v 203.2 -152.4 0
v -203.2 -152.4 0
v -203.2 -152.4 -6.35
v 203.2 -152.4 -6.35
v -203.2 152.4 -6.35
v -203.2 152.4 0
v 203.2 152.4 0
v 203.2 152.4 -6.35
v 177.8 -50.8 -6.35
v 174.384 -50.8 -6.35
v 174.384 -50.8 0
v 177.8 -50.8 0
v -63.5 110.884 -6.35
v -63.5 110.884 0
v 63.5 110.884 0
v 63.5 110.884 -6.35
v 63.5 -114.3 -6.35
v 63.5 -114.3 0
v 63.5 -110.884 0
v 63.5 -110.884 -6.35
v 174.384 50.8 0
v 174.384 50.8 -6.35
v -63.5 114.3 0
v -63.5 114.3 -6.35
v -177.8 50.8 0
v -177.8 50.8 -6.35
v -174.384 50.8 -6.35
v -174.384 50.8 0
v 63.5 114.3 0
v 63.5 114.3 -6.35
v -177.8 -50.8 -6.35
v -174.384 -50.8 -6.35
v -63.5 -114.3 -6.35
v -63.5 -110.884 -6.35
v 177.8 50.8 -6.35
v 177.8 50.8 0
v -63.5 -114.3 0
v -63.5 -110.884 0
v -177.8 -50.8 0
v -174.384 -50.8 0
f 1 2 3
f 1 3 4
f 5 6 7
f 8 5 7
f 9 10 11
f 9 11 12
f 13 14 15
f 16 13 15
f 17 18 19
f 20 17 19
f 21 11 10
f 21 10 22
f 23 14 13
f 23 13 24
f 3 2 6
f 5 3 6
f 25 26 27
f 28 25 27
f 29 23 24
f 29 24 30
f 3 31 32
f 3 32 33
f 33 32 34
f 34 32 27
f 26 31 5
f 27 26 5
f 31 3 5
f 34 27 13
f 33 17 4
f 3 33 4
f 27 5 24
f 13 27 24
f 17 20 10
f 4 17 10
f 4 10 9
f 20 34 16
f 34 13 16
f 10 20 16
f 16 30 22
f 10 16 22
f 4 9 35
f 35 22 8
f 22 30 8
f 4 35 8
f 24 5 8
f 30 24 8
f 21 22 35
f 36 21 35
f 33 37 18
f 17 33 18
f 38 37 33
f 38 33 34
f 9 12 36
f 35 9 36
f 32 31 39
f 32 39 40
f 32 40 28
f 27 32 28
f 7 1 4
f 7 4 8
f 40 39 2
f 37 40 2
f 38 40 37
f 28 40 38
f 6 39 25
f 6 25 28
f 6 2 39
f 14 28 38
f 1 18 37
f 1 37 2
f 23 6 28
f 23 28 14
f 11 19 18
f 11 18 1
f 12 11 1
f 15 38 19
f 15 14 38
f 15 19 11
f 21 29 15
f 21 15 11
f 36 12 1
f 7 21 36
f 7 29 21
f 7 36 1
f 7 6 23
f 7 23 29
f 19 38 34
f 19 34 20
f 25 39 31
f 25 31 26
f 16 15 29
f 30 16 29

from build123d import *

# Parameters (mm, degrees)
F0_W     = 406.4
F0_H     = 304.8
F0_W_2   = 127
F0_H_2   = 3.4163
F0_W_3   = 3.4163
F0_H_3   = 101.6
F1_DEPTH = 6.35


with BuildPart() as f1:
    # F0 (on Top) → F1 (new body)
    with BuildSketch(Plane.XY):
        Rectangle(F0_W, F0_H)
        with Locations((0, -112.59185)):
            Rectangle(F0_W_2, F0_H_2, mode=Mode.SUBTRACT)
        with Locations((-176.09185, 0)):
            Rectangle(F0_W_3, F0_H_3, mode=Mode.SUBTRACT)
        with Locations((0, 112.59185)):
            Rectangle(F0_W_2, F0_H_2, mode=Mode.SUBTRACT)
        with Locations((176.09185, 0)):
            Rectangle(F0_W_3, F0_H_3, mode=Mode.SUBTRACT)
    extrude(amount=-F1_DEPTH)


solid = f1.part
